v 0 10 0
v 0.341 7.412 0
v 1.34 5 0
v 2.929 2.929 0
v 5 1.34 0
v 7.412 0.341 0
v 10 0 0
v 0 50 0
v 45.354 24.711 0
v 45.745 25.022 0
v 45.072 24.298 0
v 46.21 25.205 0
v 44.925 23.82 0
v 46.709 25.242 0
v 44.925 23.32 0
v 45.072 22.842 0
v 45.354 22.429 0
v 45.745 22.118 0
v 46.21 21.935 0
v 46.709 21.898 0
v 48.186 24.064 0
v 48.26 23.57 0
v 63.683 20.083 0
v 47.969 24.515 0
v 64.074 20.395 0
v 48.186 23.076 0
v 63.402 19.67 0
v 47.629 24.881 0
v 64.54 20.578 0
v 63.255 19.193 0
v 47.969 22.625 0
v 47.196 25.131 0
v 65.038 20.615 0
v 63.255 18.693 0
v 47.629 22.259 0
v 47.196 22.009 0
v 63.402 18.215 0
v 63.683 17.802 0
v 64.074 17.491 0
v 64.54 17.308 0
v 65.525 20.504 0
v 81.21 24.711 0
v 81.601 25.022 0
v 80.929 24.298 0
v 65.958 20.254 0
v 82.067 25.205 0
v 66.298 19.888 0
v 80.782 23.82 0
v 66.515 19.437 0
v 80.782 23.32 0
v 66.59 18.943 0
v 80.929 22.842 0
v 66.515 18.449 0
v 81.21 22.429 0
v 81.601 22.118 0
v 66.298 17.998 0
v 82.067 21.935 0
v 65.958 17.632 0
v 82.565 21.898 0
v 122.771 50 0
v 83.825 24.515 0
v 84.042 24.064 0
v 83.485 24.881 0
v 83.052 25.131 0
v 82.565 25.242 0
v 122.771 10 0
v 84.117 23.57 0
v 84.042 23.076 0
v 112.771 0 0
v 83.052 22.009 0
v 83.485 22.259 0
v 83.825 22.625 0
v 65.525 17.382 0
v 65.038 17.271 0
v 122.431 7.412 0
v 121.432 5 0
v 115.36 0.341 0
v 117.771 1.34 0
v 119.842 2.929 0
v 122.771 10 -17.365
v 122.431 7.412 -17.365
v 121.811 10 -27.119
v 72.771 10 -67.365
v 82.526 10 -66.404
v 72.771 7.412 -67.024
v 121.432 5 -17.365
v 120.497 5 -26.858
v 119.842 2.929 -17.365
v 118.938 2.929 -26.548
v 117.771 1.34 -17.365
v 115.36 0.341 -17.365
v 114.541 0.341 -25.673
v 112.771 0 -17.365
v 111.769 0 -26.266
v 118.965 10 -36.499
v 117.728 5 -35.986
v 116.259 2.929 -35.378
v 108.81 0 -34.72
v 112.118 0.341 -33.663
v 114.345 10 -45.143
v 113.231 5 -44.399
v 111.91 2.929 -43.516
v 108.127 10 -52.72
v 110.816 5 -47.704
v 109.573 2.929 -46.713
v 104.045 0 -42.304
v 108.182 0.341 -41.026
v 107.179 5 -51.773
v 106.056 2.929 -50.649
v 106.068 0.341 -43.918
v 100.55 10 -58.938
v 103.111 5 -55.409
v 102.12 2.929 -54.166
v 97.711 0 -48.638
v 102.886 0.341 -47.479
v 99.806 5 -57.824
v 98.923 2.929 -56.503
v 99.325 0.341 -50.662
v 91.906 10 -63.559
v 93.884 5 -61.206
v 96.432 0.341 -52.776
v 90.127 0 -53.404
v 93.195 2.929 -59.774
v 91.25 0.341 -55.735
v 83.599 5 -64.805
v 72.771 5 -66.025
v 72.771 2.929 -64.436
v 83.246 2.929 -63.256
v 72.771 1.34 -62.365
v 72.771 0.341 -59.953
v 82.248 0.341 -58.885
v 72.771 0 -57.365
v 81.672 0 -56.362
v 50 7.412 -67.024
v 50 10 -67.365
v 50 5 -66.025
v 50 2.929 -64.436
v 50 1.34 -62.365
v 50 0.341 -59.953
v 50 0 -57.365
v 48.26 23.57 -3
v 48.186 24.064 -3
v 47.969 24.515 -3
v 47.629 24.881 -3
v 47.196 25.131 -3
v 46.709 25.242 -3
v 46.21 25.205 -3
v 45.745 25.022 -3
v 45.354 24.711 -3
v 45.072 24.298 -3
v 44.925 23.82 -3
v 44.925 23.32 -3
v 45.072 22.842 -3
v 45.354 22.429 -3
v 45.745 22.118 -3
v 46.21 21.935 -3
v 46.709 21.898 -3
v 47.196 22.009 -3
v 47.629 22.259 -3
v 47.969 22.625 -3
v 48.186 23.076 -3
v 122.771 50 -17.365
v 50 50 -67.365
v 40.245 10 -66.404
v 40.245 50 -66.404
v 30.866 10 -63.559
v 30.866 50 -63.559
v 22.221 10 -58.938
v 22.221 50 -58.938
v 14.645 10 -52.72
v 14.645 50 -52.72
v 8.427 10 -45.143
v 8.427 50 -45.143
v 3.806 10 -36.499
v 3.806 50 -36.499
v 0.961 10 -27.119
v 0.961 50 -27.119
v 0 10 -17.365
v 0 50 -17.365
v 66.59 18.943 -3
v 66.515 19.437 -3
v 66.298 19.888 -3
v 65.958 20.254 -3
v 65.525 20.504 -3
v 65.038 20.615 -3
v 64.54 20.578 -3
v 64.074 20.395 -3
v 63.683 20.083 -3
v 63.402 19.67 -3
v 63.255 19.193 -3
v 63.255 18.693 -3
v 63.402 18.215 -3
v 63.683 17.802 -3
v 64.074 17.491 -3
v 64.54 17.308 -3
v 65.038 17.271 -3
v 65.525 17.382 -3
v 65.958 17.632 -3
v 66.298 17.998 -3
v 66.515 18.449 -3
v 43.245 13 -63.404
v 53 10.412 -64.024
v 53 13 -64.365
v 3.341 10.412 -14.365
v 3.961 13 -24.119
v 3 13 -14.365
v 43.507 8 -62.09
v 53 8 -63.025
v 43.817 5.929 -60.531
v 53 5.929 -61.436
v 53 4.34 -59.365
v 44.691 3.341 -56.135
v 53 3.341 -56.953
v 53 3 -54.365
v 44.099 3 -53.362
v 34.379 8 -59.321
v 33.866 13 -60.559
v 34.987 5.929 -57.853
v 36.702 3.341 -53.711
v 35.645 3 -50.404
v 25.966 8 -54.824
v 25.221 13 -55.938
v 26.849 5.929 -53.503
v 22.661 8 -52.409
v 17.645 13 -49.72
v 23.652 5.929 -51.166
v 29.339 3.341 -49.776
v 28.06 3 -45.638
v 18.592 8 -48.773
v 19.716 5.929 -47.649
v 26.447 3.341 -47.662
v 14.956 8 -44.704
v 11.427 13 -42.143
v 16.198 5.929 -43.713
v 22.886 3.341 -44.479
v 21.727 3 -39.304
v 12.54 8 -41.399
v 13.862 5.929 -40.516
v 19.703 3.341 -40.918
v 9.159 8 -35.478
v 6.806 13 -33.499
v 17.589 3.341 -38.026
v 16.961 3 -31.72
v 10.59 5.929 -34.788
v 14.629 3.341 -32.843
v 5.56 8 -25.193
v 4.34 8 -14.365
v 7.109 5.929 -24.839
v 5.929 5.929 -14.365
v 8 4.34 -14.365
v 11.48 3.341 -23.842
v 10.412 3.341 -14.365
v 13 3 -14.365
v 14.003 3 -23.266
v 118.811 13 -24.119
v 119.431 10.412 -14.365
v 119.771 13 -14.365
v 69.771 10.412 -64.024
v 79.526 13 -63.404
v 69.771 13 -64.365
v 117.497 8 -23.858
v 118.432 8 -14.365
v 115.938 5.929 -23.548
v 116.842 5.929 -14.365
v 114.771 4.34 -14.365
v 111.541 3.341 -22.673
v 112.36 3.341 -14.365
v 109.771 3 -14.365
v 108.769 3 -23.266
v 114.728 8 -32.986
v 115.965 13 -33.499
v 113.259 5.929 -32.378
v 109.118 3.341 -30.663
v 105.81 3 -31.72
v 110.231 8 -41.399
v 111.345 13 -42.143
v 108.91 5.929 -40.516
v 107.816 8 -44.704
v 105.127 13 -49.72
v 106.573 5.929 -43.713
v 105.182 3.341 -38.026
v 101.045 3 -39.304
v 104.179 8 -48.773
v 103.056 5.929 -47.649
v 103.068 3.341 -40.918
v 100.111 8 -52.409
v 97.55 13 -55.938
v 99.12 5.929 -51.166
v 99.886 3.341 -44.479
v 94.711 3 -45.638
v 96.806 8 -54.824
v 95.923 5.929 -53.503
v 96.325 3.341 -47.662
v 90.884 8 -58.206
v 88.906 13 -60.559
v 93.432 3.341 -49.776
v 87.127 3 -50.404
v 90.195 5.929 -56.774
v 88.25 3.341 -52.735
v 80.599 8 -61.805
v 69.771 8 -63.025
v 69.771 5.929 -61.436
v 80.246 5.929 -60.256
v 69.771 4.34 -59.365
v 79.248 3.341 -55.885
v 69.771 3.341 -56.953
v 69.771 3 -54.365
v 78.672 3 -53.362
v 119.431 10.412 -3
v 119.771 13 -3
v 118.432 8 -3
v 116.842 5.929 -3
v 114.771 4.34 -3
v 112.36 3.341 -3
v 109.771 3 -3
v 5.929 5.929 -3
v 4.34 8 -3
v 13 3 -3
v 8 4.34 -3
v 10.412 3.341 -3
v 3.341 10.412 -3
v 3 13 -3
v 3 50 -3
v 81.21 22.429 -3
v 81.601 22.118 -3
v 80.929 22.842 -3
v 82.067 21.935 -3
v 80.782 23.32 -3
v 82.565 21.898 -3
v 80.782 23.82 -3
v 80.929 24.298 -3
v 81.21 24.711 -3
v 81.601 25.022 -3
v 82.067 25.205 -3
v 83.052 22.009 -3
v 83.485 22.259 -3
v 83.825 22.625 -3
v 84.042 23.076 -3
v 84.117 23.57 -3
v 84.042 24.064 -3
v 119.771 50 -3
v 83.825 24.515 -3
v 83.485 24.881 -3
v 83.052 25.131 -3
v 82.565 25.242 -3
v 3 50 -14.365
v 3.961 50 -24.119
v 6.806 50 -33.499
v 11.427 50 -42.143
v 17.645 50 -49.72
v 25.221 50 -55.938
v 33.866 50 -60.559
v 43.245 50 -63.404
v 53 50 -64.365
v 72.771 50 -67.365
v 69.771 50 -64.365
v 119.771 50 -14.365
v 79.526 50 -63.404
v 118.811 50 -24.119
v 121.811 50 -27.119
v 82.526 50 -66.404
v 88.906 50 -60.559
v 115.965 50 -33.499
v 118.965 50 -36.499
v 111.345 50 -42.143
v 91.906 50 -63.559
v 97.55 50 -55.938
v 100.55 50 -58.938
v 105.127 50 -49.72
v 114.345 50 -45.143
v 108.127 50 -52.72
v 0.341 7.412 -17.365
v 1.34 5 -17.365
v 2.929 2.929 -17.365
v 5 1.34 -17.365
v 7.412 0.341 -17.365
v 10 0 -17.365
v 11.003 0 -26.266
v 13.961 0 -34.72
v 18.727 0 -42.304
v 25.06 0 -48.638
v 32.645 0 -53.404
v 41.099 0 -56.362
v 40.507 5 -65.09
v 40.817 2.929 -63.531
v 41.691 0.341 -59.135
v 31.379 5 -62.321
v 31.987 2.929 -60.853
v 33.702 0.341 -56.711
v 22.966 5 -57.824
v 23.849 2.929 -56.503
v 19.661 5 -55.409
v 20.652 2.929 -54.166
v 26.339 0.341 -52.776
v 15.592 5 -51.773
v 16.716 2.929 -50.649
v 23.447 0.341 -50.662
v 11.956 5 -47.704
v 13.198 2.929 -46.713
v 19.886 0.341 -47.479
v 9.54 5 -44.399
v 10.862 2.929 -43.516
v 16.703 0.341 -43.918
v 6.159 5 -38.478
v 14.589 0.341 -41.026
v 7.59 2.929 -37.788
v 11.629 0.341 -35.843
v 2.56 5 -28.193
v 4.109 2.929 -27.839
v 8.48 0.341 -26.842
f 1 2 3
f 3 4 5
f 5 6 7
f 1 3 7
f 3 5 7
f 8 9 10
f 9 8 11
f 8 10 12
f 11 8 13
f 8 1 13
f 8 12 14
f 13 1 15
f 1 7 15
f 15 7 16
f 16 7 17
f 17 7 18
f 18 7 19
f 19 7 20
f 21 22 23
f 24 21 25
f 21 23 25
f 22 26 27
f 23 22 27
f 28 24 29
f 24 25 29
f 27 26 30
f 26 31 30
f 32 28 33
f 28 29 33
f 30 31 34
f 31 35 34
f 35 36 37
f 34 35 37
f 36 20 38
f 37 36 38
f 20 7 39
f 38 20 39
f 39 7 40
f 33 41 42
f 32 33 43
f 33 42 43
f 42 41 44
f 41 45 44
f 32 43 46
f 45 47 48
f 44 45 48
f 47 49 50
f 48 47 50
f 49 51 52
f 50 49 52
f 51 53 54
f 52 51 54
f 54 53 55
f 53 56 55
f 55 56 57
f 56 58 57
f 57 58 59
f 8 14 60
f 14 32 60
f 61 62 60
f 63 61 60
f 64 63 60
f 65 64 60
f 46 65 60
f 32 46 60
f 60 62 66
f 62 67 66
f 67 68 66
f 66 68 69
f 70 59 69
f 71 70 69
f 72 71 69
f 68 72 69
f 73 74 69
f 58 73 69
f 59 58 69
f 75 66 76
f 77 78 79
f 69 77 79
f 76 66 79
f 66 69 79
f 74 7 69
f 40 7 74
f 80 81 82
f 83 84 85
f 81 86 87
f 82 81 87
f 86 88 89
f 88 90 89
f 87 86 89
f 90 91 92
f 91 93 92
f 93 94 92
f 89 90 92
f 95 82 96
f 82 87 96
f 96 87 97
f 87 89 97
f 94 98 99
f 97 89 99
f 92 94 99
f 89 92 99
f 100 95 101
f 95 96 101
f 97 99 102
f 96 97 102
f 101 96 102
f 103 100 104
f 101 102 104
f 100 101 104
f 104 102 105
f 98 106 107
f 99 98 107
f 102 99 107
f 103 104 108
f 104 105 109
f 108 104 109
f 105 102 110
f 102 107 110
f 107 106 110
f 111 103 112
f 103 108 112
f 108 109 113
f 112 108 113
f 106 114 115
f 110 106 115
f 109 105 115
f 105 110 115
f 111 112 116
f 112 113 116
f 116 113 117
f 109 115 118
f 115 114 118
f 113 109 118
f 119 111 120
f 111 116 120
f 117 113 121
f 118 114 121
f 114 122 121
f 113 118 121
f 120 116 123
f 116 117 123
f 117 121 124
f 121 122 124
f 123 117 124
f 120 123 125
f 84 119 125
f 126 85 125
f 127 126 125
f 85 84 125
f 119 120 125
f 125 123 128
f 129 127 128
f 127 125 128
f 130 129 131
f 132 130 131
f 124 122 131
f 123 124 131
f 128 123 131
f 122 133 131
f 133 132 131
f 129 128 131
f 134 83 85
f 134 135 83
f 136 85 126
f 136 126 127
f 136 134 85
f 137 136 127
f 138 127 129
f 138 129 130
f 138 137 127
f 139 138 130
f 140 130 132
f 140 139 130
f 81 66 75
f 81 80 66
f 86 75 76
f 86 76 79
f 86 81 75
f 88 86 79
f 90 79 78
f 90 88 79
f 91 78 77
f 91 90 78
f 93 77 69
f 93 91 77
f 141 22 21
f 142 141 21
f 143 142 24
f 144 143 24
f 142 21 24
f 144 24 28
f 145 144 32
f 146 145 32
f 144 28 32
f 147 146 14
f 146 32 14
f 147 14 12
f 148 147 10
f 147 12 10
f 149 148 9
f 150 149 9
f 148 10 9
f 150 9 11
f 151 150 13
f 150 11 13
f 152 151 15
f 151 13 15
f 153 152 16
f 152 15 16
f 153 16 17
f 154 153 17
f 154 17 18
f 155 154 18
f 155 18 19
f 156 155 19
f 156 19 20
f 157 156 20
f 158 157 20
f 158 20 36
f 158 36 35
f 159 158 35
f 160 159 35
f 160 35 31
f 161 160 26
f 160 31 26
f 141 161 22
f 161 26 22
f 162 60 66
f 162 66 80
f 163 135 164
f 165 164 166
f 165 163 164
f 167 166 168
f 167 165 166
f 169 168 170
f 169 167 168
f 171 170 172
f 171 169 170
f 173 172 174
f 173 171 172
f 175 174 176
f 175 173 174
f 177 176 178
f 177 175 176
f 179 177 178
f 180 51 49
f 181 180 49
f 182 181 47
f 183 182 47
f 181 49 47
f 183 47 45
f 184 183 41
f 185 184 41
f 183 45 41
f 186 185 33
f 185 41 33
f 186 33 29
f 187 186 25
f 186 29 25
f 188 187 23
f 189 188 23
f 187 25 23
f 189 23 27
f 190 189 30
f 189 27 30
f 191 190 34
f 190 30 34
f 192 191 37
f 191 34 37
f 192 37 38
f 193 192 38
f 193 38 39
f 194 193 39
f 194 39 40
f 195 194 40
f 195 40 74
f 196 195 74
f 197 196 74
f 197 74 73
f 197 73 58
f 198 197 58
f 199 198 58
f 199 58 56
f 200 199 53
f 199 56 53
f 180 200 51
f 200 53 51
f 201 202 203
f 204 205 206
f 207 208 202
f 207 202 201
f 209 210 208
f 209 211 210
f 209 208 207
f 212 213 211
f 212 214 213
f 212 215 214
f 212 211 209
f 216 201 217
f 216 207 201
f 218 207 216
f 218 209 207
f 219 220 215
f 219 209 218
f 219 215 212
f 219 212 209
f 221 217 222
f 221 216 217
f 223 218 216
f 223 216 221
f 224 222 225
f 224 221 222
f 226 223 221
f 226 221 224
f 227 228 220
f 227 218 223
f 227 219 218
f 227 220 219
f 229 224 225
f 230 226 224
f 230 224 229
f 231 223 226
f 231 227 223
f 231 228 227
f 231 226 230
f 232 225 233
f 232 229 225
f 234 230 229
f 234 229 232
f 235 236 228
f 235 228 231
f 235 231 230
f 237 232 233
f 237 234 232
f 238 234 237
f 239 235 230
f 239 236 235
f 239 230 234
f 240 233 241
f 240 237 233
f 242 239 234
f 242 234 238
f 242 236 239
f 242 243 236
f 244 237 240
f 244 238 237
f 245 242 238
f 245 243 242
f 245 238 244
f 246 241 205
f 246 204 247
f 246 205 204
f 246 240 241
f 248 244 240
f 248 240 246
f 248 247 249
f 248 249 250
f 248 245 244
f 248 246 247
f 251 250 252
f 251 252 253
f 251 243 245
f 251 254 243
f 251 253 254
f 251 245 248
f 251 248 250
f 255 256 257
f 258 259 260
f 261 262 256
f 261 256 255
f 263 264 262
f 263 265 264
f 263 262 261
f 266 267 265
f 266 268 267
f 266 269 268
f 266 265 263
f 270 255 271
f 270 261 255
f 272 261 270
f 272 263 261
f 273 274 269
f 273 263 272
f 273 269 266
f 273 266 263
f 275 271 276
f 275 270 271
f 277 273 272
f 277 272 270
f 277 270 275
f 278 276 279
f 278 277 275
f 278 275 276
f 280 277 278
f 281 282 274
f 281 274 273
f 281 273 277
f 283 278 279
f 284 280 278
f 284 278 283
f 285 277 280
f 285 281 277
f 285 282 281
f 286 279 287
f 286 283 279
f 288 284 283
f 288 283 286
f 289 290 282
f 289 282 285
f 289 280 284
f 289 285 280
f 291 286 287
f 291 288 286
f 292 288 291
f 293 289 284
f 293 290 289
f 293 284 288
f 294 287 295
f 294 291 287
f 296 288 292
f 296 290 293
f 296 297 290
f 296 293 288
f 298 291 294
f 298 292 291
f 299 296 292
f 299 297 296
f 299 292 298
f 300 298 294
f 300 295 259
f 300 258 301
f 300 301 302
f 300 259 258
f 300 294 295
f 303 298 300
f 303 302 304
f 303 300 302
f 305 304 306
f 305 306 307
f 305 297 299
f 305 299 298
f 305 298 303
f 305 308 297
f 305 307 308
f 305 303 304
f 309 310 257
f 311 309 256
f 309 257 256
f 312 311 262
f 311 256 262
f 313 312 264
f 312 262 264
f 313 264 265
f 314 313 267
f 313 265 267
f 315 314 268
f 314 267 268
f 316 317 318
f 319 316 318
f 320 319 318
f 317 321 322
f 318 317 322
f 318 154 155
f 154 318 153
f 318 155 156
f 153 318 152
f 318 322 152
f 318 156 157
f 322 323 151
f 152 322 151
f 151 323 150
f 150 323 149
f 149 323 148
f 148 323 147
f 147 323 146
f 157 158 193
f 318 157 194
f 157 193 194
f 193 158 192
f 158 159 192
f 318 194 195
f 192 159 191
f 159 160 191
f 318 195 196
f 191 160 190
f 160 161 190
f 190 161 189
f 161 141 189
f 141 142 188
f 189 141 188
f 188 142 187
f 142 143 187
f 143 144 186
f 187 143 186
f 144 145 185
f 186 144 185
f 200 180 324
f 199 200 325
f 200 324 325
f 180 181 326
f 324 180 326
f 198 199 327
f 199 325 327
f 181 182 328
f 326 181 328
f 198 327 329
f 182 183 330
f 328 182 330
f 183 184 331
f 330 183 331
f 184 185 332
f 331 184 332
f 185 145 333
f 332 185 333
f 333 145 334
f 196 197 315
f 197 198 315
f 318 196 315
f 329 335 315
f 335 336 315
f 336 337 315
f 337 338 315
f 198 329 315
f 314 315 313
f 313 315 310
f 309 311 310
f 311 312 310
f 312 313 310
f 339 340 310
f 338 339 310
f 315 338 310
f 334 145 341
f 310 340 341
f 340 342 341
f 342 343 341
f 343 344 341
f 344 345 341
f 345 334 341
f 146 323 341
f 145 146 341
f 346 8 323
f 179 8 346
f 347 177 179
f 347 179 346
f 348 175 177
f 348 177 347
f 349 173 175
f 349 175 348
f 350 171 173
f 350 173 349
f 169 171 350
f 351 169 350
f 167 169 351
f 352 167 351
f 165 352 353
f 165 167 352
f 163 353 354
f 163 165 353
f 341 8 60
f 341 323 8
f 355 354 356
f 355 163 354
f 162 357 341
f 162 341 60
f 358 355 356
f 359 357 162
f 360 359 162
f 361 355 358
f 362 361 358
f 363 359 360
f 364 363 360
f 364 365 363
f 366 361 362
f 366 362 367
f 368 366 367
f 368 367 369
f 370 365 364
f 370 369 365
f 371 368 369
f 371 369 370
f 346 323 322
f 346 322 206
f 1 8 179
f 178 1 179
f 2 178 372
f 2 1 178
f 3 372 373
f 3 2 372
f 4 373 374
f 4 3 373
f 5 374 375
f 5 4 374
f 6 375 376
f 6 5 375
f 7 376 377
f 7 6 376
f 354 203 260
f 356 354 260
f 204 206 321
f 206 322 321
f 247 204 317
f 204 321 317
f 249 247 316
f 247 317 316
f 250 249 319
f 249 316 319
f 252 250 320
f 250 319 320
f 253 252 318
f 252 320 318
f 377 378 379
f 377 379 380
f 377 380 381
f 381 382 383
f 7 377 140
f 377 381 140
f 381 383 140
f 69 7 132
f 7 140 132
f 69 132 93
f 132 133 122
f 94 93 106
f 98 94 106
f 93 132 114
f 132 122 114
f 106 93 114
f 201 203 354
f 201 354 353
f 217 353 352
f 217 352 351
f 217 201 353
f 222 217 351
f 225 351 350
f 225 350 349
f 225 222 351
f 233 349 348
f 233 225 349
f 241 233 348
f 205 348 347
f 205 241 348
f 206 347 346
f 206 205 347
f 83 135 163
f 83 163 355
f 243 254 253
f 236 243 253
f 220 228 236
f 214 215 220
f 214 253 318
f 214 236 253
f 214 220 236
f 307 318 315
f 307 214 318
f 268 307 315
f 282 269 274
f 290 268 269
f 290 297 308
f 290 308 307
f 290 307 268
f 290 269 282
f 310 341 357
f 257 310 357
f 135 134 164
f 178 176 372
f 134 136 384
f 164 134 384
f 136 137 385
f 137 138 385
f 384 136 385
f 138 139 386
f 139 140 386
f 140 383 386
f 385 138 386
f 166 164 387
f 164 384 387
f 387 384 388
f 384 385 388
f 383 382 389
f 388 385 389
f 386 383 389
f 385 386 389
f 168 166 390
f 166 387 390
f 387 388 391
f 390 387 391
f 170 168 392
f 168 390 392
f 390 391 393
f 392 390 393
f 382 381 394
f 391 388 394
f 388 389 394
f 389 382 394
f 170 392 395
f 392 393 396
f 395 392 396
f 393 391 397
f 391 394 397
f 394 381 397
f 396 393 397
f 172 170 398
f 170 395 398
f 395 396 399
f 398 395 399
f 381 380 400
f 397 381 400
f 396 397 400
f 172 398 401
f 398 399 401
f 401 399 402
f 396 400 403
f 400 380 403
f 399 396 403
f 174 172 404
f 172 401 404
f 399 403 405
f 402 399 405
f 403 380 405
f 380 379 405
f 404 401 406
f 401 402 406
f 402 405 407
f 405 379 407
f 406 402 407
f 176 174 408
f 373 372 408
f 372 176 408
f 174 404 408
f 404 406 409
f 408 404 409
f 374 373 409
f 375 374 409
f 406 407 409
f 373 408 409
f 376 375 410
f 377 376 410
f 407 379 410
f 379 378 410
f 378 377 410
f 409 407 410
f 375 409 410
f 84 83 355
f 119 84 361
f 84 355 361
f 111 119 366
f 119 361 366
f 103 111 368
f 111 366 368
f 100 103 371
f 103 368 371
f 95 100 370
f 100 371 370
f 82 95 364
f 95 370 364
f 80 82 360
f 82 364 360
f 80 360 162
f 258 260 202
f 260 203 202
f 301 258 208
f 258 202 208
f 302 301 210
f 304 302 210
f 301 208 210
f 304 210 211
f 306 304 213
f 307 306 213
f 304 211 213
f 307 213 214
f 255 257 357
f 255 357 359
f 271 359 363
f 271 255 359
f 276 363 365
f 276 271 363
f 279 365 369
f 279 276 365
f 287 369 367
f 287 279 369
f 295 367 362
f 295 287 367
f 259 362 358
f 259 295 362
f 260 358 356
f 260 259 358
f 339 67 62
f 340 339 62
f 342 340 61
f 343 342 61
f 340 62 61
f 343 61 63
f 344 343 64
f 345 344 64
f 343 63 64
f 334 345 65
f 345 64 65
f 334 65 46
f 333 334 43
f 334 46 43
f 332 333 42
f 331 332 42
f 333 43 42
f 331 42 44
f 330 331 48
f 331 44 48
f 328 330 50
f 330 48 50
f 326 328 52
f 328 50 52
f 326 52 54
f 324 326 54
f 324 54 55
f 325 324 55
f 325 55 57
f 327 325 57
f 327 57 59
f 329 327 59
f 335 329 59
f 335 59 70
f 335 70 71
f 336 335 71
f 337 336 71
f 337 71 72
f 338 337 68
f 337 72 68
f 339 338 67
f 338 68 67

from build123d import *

# Parameters (mm, degrees)
SKETCH1_W           = 122.771416508
SKETCH1_H           = 67.364835681
BOSS_EXTRUDE1_DEPTH = 50
SKETCH2_W           = 116.771416508
SKETCH2_H           = 61.364835681
CUT_EXTRUDE1_DEPTH  = 47
SKETCH3_R           = 1.676937057
CUT_EXTRUDE3_DEPTH  = 3
FILLET7_R           = 50
FILLET8_R           = 50
FILLET9_R           = 50
FILLET10_R          = 50
FILLET11_R          = 10
FILLET12_R          = 10


with BuildPart() as part:
    # Sketch1 → Boss-Extrude1 (new body)
    with BuildSketch(Plane(origin=(0, 0, 0), x_dir=(1, 0, 0), z_dir=(0, 1, 0))):
        with Locations((61.385708254, 33.682417841)):
            Rectangle(SKETCH1_W, SKETCH1_H)
    extrude(amount=BOSS_EXTRUDE1_DEPTH)

    # Sketch2 → Cut-Extrude1 (cut)
    with BuildSketch(Plane(origin=(0, 50, 0), x_dir=(1, 0, 0), z_dir=(0, 1, 0))):
        with Locations((61.385708254, 33.682417841)):
            Rectangle(SKETCH2_W, SKETCH2_H)
    extrude(amount=-CUT_EXTRUDE1_DEPTH, mode=Mode.SUBTRACT)

    # Sketch3 → Cut-Extrude3 (cut)
    with BuildSketch(Plane.XY):
        with Locations((46.583182692, 23.569957767)):
            Circle(SKETCH3_R)
        with Locations((64.912755506, 18.942876873)):
            Circle(SKETCH3_R)
        with Locations((82.439773274, 23.569957767)):
            Circle(SKETCH3_R)
    extrude(amount=-CUT_EXTRUDE3_DEPTH, mode=Mode.SUBTRACT)

    # Fillet7
    fillet7_edges = [part.edges().sort_by_distance(p)[0] for p in [
        (119.771416508, 26.5, -64.364835681),
    ]]
    fillet(fillet7_edges, radius=FILLET7_R)

    # Fillet8
    fillet8_edges = [part.edges().sort_by_distance(p)[0] for p in [
        (122.771416508, 25, -67.364835681),
    ]]
    fillet(fillet8_edges, radius=FILLET8_R)

    # Fillet9
    fillet9_edges = [part.edges().sort_by_distance(p)[0] for p in [
        (3, 26.5, -64.364835681),
    ]]
    fillet(fillet9_edges, radius=FILLET9_R)

    # Fillet10
    fillet10_edges = [part.edges().sort_by_distance(p)[0] for p in [
        (0, 25, -67.364835681),
    ]]
    fillet(fillet10_edges, radius=FILLET10_R)

    # Fillet11
    fillet11_edges = [part.edges().sort_by_distance(p)[0] for p in [
        (119.771416508, 3, -8.682417841),
        (61.385708254, 3, -64.364835681),
        (105.126755567, 3, -49.720174741),
        (3, 3, -8.682417841),
        (17.644660941, 3, -49.720174741),
    ]]
    fillet(fillet11_edges, radius=FILLET11_R)

    # Fillet12
    fillet12_edges = [part.edges().sort_by_distance(p)[0] for p in [
        (122.771416508, 0, -8.682417841),
        (61.385708254, 0, -67.364835681),
        (108.126755567, 0, -52.720174741),
        (0, 0, -8.682417841),
        (14.644660941, 0, -52.720174741),
    ]]
    fillet(fillet12_edges, radius=FILLET12_R)


solid = part.part
